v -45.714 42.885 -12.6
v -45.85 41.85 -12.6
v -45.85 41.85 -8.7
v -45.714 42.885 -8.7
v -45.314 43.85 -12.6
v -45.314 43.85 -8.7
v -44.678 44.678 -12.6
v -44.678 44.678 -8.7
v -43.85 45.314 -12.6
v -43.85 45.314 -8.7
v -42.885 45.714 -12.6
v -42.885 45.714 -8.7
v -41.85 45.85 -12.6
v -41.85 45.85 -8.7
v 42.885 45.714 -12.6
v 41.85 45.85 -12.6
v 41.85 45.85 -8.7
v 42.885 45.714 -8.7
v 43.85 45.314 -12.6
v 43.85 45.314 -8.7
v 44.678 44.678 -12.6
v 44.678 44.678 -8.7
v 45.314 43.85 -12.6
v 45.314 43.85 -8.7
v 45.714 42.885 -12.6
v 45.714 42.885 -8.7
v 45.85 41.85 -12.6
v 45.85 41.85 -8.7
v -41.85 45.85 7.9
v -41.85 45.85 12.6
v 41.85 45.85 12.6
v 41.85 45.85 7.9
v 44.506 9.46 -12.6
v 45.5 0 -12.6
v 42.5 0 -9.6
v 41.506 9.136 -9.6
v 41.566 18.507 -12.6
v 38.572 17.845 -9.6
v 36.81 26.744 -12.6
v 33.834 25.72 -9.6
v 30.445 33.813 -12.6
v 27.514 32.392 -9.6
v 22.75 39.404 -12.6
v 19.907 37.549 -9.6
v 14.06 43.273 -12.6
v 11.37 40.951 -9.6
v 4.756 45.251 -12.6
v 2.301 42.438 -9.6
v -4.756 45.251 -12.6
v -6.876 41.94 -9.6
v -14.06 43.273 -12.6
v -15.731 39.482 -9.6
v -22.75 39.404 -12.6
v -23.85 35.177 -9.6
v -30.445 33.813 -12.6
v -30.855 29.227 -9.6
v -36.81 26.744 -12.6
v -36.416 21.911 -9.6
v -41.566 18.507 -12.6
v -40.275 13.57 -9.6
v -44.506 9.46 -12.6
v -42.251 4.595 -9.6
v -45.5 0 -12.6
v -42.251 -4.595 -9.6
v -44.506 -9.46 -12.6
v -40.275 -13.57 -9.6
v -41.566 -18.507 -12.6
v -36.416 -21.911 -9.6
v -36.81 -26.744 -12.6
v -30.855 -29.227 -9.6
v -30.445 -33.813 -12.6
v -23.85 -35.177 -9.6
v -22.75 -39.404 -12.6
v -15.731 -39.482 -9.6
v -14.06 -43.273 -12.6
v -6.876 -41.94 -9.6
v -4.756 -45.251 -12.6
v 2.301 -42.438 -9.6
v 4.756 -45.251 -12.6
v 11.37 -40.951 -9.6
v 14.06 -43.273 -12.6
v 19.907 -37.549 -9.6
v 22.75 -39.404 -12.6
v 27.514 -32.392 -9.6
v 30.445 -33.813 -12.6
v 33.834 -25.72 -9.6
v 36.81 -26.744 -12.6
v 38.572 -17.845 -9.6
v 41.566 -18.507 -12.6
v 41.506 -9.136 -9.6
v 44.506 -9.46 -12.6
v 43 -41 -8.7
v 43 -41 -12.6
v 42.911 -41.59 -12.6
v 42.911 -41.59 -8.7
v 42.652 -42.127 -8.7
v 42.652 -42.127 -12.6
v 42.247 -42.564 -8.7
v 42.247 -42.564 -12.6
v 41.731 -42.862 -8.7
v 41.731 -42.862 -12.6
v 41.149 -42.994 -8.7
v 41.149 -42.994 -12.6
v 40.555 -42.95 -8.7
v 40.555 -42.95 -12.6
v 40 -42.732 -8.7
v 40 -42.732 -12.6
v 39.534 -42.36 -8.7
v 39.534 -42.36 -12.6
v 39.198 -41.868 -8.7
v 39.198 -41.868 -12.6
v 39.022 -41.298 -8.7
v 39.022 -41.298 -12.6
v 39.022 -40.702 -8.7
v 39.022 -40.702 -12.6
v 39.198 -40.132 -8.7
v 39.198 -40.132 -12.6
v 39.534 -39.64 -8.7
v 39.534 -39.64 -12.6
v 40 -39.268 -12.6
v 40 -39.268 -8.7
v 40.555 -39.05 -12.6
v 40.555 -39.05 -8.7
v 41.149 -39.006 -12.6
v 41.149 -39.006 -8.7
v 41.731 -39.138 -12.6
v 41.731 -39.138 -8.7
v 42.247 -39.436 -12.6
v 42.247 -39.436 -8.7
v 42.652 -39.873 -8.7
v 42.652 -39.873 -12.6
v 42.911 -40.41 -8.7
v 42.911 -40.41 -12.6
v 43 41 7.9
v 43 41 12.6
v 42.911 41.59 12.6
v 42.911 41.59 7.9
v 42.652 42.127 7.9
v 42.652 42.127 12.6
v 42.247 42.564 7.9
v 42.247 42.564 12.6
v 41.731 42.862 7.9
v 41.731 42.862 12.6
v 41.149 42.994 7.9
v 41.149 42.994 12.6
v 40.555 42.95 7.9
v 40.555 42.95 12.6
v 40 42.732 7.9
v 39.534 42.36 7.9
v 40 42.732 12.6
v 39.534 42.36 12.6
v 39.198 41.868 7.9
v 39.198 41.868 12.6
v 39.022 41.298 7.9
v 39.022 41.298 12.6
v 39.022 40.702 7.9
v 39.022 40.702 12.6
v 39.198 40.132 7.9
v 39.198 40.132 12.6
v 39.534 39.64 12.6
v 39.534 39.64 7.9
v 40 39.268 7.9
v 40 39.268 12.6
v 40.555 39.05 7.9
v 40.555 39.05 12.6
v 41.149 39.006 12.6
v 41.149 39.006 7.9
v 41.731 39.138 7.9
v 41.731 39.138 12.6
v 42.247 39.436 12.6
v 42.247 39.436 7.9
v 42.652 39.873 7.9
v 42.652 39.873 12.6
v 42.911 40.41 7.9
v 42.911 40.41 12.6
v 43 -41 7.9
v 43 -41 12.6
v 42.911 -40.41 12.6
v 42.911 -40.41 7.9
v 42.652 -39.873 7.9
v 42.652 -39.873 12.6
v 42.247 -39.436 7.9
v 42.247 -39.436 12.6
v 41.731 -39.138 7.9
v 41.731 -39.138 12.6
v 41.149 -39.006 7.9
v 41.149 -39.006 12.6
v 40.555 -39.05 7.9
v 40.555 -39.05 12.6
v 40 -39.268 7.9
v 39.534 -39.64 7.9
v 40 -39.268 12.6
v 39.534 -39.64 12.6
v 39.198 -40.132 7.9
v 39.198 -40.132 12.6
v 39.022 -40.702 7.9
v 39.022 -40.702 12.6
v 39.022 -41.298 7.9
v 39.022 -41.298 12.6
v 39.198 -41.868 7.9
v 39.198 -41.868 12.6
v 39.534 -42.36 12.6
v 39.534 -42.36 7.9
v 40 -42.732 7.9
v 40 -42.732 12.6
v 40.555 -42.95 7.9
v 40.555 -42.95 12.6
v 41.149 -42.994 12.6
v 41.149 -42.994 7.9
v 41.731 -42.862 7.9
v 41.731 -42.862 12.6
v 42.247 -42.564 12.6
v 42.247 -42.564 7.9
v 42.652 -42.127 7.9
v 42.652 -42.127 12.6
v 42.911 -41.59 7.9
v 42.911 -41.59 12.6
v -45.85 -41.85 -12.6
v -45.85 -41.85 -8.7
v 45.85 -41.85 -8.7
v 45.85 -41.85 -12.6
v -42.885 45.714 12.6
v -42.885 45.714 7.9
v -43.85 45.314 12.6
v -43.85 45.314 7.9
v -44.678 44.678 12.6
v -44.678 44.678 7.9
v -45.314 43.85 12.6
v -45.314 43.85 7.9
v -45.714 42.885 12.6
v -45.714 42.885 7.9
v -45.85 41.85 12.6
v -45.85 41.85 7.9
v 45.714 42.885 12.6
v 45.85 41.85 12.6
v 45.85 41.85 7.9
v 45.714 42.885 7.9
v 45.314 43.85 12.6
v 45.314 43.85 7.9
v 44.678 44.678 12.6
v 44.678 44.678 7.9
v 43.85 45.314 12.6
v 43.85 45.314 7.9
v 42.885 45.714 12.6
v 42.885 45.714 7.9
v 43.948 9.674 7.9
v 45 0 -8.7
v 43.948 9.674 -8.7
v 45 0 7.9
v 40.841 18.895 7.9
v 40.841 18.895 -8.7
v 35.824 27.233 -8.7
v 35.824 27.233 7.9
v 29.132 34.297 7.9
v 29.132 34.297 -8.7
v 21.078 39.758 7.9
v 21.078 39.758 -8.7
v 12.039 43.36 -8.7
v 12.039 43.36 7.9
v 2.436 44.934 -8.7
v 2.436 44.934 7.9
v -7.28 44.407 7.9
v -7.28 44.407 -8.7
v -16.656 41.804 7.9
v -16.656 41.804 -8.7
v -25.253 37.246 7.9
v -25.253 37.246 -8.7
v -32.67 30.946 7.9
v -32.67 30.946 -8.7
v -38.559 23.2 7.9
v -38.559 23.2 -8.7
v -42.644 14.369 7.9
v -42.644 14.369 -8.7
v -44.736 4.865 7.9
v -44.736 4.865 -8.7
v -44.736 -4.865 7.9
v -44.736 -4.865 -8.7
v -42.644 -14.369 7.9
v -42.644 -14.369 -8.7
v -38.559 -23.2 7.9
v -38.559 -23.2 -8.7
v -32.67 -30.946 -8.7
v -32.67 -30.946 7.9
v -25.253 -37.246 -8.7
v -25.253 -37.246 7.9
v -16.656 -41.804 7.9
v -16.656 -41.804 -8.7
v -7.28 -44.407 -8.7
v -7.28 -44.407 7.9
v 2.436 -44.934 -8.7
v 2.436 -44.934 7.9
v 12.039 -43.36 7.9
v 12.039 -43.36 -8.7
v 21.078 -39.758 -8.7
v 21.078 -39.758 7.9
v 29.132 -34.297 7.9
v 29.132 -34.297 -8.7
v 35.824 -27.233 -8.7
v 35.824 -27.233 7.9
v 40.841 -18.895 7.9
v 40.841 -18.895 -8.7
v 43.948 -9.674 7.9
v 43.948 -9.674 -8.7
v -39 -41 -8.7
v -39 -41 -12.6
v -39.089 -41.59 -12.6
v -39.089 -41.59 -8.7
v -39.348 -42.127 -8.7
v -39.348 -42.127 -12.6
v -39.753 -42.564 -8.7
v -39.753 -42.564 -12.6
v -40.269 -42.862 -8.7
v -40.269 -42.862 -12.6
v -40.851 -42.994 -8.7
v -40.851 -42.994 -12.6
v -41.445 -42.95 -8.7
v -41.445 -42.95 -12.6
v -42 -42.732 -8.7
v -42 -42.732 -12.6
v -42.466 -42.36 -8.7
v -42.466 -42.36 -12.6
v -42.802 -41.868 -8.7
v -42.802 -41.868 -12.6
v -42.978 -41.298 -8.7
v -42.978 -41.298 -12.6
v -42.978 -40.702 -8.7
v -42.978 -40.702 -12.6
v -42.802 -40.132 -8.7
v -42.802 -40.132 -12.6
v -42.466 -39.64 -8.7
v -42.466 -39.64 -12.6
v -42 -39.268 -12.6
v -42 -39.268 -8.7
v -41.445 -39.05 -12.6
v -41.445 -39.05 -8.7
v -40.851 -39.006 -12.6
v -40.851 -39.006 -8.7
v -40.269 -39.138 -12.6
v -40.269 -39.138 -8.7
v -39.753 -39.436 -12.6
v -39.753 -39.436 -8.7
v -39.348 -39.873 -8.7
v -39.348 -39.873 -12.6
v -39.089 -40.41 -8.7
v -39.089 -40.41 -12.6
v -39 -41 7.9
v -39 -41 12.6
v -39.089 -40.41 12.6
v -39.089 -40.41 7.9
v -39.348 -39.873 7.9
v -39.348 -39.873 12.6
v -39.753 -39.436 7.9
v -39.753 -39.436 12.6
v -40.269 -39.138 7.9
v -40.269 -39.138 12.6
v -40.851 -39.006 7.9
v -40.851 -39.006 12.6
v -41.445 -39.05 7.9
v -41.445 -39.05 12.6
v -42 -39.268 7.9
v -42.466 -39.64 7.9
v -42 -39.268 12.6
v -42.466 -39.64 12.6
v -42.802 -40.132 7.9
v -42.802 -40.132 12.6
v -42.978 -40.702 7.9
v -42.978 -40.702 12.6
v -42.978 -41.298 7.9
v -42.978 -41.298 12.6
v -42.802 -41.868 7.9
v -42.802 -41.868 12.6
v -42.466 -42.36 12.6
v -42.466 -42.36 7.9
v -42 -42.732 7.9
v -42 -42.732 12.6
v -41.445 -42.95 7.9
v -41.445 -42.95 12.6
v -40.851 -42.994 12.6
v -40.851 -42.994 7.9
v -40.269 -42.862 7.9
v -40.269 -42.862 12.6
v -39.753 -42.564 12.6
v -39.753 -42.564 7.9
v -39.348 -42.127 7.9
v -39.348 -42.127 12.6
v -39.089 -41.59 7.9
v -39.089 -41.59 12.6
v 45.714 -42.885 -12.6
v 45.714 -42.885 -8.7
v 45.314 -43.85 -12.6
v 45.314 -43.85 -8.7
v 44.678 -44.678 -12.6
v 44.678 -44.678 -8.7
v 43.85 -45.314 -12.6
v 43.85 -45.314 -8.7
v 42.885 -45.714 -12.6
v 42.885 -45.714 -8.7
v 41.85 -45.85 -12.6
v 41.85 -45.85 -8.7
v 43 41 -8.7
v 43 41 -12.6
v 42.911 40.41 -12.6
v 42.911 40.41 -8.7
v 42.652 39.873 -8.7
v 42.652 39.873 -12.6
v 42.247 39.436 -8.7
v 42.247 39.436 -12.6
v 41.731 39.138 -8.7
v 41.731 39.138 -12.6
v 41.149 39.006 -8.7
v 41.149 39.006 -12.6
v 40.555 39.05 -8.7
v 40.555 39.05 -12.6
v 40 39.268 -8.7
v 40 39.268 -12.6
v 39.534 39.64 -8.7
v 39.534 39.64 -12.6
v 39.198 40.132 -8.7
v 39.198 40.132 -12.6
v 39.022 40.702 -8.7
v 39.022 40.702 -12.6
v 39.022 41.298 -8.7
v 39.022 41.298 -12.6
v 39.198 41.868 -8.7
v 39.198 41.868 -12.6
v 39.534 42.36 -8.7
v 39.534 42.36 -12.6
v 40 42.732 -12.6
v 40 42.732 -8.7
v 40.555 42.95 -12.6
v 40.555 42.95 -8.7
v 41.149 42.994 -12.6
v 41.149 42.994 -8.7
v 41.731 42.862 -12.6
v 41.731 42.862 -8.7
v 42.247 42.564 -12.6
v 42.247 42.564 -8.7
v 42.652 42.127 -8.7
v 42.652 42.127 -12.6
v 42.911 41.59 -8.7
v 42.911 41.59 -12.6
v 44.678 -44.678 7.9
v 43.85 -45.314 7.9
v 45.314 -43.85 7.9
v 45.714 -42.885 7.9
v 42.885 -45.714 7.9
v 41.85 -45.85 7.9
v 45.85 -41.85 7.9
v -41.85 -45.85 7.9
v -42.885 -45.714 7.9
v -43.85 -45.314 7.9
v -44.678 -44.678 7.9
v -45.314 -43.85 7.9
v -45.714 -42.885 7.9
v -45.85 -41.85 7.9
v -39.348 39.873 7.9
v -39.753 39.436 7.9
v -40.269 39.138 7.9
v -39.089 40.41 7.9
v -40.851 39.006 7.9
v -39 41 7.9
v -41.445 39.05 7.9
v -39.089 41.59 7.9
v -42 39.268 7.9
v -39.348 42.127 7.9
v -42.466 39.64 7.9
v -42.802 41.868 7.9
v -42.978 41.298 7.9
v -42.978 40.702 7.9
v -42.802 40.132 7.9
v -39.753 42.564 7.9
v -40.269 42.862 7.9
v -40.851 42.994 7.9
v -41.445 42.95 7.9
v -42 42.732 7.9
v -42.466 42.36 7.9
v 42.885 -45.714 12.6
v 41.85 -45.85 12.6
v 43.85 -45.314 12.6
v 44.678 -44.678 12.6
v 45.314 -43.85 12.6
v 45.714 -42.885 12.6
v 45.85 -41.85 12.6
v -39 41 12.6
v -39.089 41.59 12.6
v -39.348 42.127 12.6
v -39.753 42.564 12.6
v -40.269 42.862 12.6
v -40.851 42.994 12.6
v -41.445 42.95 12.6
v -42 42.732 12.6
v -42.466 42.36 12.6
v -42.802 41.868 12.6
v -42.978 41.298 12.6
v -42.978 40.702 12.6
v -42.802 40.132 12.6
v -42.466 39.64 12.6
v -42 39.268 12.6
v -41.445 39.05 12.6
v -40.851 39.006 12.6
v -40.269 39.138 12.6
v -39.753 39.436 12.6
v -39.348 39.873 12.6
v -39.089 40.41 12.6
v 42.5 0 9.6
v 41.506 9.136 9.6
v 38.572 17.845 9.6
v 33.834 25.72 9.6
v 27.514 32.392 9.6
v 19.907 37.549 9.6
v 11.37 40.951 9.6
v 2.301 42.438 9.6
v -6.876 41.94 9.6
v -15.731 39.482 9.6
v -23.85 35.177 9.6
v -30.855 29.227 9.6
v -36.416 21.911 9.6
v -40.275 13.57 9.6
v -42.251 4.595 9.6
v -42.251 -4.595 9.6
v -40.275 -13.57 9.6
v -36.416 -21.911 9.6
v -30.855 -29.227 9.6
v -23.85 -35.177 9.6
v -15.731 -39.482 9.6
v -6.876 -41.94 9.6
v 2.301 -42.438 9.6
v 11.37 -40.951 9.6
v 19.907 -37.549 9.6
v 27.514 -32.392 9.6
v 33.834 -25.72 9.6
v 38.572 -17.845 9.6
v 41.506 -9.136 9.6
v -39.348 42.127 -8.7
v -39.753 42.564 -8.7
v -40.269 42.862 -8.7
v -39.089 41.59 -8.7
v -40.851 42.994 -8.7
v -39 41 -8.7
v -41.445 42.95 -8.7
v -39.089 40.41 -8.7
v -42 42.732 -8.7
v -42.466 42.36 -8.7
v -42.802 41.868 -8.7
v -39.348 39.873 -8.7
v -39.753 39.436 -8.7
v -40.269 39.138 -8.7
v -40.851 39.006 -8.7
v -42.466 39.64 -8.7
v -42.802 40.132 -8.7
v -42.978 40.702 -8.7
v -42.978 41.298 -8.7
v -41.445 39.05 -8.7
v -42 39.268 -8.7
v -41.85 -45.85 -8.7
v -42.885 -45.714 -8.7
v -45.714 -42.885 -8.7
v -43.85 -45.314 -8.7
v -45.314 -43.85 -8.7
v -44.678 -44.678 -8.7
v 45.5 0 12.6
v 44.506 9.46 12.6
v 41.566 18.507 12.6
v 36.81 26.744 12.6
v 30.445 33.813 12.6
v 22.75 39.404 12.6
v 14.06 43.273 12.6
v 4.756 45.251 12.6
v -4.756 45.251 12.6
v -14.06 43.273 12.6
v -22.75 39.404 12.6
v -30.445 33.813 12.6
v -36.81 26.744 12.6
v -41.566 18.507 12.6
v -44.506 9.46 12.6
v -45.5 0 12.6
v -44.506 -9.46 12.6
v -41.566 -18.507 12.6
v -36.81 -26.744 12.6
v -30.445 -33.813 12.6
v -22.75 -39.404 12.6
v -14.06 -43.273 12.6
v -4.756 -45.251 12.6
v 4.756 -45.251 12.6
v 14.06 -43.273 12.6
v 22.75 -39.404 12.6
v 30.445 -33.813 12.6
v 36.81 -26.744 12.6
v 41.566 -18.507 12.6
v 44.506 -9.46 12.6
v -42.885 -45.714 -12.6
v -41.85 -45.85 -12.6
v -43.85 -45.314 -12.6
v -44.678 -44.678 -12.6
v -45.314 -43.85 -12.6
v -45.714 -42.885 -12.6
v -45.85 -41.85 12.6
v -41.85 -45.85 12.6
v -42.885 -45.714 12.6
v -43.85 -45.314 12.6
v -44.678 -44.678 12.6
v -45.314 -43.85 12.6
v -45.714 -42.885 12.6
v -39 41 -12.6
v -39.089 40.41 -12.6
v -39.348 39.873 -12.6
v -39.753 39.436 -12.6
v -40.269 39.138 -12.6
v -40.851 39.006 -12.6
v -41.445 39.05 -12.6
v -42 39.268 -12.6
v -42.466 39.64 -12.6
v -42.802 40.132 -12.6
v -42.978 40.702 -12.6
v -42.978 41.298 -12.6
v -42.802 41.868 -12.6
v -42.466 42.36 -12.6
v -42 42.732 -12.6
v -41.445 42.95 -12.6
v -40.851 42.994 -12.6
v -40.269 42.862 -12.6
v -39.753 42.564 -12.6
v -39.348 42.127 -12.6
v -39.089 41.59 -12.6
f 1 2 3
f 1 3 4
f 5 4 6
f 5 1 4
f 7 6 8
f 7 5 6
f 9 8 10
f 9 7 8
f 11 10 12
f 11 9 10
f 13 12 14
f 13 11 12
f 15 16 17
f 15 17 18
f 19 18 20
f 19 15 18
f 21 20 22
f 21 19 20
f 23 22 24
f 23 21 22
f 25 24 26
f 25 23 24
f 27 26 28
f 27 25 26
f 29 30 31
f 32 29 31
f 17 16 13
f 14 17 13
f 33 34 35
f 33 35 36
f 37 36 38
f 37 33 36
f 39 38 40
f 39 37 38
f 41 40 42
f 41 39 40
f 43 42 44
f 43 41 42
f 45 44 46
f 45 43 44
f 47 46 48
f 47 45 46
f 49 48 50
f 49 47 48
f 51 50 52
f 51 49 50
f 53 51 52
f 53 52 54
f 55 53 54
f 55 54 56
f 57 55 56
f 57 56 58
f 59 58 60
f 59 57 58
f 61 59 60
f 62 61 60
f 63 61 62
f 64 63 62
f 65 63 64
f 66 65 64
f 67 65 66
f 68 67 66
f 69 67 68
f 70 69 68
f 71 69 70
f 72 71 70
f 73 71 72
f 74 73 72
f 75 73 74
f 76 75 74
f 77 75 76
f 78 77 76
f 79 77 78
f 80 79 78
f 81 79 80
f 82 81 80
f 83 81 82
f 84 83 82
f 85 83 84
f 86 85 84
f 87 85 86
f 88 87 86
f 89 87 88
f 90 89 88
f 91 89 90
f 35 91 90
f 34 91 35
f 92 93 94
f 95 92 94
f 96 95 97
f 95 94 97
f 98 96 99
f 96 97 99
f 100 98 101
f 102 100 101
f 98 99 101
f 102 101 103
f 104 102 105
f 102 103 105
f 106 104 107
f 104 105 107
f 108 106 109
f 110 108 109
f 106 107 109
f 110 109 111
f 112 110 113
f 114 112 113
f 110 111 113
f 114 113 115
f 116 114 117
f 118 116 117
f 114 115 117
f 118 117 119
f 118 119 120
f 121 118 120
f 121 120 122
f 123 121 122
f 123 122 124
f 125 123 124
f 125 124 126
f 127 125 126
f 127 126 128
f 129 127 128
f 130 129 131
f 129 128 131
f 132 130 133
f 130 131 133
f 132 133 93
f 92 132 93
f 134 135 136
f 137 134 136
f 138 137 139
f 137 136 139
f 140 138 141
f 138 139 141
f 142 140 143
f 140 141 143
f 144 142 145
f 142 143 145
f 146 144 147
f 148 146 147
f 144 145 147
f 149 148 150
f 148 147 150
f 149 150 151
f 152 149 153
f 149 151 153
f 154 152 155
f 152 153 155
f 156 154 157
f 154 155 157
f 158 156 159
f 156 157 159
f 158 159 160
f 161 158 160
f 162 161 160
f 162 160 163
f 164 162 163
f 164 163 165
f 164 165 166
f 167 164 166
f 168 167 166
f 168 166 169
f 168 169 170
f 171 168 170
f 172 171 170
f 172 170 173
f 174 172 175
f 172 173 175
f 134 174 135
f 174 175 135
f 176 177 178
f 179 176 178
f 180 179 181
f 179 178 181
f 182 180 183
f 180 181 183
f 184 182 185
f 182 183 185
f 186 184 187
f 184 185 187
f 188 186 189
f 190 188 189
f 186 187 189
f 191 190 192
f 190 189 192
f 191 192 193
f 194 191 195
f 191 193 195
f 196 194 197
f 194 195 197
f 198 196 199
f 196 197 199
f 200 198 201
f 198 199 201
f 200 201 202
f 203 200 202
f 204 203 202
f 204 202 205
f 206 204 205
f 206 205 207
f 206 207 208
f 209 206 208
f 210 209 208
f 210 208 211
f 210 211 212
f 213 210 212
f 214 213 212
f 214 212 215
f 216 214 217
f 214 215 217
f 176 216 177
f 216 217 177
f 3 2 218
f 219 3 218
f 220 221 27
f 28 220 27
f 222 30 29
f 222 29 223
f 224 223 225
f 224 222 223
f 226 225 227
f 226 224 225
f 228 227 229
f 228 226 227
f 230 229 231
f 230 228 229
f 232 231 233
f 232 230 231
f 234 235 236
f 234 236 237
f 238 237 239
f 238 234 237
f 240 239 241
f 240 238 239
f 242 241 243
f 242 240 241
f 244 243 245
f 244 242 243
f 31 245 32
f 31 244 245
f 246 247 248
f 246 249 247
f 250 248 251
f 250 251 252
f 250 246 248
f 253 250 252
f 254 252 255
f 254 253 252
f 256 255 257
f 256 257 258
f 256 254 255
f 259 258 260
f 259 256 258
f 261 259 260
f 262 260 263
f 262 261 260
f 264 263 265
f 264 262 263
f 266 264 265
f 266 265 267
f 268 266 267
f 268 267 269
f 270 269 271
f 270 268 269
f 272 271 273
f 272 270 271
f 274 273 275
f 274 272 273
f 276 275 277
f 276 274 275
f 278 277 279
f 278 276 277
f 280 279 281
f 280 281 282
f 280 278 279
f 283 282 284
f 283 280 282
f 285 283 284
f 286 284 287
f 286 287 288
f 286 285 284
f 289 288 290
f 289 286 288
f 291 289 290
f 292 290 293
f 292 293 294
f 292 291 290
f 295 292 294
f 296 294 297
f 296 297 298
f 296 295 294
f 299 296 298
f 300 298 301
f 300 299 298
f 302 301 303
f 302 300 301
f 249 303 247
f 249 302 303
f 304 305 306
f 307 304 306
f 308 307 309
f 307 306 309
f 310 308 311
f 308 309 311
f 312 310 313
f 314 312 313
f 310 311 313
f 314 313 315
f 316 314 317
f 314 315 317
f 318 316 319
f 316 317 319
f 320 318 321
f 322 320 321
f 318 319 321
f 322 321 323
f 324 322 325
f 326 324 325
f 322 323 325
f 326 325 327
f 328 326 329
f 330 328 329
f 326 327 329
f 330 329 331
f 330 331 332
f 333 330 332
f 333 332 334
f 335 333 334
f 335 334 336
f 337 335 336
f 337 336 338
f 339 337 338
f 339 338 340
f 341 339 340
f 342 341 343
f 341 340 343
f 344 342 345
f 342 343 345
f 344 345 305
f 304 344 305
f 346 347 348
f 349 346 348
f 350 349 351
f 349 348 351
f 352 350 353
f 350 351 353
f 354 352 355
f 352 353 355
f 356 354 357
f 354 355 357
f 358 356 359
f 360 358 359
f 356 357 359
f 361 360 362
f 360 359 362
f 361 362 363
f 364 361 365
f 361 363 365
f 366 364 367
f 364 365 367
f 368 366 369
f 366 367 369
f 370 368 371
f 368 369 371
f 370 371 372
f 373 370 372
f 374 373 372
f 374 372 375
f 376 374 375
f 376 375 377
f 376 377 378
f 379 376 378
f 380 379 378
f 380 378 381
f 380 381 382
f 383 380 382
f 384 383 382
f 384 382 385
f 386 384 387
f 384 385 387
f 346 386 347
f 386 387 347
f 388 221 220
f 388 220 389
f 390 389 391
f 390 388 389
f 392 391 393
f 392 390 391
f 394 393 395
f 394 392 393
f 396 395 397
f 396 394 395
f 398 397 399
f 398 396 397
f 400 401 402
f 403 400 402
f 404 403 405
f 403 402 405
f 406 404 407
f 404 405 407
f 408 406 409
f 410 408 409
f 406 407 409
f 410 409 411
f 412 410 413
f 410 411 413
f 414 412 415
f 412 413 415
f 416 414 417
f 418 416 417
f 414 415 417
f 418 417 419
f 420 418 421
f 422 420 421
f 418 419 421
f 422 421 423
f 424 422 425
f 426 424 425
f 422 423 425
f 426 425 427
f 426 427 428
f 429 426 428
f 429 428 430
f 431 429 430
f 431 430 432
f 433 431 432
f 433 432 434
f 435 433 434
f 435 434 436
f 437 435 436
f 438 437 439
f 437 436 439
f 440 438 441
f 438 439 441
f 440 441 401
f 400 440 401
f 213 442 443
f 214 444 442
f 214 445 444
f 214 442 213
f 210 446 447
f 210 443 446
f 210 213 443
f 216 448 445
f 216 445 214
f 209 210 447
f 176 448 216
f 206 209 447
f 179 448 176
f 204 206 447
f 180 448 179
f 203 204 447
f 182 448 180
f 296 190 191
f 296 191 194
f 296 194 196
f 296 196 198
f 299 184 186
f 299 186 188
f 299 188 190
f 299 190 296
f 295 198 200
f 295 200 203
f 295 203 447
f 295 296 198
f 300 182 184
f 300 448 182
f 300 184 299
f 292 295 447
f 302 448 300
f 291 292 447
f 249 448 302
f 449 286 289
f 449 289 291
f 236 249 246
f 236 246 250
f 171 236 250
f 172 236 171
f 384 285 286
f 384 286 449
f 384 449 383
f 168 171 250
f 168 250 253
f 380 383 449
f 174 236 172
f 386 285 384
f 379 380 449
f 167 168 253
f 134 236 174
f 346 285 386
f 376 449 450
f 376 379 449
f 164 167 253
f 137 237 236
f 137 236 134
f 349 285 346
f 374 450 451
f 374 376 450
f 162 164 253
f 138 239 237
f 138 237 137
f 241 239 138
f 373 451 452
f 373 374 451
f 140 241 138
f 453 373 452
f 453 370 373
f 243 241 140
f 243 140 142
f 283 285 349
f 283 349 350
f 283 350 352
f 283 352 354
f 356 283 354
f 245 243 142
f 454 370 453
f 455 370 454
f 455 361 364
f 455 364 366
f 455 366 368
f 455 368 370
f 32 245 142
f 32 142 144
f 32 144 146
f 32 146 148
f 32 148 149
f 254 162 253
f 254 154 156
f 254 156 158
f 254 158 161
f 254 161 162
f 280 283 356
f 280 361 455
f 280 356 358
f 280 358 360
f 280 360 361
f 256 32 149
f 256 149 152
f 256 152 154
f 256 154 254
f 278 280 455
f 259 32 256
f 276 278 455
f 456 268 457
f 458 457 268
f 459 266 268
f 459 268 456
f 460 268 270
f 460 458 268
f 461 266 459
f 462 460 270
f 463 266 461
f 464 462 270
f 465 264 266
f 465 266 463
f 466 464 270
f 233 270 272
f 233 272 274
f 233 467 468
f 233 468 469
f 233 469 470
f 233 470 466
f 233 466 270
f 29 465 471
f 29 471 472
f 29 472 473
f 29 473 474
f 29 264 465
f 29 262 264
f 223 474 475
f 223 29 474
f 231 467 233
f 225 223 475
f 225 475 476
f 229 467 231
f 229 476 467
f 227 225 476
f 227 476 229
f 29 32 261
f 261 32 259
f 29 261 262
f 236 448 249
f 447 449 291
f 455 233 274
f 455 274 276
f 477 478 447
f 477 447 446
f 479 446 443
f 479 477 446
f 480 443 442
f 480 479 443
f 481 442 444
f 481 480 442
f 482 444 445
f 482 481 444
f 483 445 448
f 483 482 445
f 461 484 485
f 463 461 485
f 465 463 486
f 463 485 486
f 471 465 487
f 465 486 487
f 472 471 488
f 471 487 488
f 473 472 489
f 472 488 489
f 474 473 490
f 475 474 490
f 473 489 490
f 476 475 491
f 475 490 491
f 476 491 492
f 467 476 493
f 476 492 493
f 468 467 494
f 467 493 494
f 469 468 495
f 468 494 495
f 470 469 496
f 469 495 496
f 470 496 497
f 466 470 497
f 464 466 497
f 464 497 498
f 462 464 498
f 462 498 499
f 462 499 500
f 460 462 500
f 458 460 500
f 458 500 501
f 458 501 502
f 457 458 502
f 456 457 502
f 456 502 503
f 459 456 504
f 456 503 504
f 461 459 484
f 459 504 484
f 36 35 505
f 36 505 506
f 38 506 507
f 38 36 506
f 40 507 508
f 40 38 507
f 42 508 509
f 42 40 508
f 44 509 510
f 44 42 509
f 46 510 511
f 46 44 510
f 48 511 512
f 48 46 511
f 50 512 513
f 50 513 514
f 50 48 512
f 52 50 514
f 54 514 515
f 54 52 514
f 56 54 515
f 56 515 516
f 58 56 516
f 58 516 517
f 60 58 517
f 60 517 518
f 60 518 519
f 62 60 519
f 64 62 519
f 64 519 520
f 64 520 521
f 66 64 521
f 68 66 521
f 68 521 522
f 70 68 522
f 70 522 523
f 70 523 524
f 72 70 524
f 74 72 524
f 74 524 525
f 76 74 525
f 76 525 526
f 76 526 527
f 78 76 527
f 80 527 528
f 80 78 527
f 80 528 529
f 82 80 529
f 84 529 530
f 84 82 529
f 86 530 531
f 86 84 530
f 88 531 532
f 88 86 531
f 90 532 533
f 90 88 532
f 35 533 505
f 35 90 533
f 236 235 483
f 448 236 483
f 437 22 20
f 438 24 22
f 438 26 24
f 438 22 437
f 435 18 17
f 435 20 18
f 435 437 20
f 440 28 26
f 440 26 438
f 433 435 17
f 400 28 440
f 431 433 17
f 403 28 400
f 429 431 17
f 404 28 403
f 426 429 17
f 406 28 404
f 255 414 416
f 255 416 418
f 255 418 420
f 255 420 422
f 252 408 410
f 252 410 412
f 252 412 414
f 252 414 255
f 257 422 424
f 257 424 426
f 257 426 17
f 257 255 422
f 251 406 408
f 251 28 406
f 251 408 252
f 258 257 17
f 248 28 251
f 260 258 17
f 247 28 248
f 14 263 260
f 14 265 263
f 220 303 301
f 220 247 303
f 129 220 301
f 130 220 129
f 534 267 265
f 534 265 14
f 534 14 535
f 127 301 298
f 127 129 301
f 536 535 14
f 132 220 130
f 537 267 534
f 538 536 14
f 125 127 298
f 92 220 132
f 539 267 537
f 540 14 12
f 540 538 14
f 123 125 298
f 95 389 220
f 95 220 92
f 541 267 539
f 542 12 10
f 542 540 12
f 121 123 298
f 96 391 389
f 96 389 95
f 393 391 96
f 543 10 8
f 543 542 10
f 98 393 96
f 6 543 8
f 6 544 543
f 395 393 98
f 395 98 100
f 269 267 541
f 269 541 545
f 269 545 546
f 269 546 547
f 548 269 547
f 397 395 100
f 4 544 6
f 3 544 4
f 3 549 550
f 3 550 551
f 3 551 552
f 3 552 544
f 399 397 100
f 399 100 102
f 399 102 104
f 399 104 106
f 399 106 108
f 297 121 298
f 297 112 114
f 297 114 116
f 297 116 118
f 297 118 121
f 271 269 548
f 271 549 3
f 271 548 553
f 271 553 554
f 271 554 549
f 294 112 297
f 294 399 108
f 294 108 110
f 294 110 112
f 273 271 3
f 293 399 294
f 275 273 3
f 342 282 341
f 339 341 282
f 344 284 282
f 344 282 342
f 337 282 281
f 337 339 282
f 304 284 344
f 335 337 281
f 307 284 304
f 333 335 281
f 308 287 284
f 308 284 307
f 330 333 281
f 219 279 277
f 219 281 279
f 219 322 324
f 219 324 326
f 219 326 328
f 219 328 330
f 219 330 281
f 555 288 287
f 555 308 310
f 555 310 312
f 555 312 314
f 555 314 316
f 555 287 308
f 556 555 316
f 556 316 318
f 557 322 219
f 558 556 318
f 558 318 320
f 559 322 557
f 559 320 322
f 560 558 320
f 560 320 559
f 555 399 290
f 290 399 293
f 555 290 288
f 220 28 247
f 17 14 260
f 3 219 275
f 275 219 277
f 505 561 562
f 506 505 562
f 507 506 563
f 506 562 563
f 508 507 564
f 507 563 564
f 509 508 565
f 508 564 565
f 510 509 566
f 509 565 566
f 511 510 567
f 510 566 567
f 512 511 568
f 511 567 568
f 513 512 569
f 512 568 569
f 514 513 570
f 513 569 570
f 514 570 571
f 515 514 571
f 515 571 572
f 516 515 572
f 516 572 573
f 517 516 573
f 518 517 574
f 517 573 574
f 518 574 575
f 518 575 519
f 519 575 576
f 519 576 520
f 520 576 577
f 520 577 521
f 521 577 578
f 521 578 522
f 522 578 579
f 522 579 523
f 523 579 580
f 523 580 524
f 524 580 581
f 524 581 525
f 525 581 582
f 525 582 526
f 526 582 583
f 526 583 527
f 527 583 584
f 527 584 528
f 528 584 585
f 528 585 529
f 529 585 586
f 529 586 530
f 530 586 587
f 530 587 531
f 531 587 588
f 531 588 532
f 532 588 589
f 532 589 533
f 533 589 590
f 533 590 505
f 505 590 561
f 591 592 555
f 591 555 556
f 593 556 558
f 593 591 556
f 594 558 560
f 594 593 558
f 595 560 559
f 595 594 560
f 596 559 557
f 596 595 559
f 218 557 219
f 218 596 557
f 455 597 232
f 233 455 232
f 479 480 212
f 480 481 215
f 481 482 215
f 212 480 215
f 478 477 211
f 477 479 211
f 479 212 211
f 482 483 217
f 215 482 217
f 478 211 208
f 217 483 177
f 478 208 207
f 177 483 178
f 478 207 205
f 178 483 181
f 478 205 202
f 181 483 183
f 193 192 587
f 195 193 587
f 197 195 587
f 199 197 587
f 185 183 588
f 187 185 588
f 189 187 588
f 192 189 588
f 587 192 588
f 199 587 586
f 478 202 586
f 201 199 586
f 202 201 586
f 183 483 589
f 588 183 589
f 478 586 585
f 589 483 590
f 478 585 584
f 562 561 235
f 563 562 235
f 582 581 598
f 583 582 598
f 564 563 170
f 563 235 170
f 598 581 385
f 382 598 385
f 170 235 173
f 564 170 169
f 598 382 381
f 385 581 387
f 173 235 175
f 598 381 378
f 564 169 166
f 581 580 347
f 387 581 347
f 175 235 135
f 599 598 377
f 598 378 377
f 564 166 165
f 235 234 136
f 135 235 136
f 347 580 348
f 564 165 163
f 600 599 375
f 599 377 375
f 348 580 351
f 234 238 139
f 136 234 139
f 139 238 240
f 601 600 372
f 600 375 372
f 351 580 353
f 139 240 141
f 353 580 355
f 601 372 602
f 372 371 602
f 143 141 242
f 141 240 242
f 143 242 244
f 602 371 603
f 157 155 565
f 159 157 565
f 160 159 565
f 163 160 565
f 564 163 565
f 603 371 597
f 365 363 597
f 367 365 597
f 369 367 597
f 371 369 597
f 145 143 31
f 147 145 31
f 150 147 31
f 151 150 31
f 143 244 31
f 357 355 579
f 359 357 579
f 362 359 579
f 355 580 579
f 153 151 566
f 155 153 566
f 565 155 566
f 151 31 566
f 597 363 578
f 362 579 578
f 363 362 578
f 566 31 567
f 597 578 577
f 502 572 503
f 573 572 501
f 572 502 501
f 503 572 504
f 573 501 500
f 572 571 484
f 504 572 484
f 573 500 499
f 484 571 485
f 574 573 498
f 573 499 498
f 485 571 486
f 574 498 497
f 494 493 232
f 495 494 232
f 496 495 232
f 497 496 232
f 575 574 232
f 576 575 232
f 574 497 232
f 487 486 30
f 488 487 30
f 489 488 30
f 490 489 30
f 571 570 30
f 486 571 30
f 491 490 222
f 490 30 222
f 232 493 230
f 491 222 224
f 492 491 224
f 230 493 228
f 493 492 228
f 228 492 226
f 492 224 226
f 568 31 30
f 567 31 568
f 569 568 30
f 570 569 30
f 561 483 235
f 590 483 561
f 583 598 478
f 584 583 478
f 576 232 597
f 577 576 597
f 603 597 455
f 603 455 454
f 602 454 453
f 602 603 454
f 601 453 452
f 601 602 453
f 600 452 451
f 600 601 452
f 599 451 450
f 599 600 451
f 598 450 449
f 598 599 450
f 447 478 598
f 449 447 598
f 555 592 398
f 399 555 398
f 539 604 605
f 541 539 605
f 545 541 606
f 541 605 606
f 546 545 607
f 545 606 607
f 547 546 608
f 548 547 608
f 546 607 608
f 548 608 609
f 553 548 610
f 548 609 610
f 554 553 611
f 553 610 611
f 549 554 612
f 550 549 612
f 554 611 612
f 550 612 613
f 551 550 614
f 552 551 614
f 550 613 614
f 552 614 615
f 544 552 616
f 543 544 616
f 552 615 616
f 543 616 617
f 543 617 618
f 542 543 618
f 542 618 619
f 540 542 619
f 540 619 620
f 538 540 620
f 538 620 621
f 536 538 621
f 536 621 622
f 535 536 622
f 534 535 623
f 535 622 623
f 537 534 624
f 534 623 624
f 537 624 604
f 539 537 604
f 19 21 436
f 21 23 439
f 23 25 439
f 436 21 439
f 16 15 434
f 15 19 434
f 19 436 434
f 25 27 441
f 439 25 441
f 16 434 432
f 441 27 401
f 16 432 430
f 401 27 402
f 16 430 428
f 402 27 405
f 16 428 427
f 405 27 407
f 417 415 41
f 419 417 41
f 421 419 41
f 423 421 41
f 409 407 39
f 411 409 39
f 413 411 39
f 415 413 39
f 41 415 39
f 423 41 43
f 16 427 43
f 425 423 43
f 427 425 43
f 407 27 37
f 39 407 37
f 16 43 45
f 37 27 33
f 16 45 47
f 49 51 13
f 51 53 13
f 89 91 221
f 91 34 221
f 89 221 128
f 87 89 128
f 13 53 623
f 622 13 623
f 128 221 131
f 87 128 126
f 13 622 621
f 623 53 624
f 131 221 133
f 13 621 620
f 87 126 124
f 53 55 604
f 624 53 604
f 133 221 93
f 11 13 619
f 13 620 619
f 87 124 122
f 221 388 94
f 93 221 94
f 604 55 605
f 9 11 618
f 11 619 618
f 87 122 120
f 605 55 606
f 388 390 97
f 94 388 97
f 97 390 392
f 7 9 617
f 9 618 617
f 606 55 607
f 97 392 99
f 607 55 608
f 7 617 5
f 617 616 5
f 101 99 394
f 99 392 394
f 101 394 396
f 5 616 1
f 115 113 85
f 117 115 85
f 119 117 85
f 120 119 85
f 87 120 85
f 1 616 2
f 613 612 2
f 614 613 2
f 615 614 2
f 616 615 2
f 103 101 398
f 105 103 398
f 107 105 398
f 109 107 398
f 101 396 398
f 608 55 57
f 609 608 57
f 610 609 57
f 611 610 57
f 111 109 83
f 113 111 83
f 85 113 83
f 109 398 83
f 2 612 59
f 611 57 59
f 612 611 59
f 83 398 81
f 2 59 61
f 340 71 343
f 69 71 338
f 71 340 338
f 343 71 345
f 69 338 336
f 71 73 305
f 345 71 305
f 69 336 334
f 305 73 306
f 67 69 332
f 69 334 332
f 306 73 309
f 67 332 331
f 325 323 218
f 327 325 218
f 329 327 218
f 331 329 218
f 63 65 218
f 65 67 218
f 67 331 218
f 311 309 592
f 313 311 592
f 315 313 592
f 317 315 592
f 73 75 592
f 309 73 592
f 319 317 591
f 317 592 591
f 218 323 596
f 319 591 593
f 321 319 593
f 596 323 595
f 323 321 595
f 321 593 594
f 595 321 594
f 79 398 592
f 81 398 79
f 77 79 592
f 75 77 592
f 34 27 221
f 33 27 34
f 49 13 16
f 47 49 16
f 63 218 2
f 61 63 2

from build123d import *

# Parameters (mm, degrees)
SKETCH_R        = 45
SKETCH_R_2      = 42.5
PAD_DEPTH       = 12.6
SKETCH001_R     = 2
SKETCH001_R_2   = 44.5
PAD001_DEPTH    = 4.7
SKETCH002_R     = 2
SKETCH002_R_2   = 44.5
PAD002_DEPTH    = 3.9
CHAMFER_SIZE    = 3
CHAMFER001_SIZE = 3


with BuildPart() as part:
    # Sketch → Pad (new body, symmetric)
    with BuildSketch(Plane.XY):
        Circle(SKETCH_R)
        Circle(SKETCH_R_2, mode=Mode.SUBTRACT)
    extrude(amount=PAD_DEPTH, both=True)

    # Sketch001 (on Face4 of Pad) → Pad001 (join)
    with BuildSketch(Plane.XY.offset(12.6)):
        with BuildLine():
            Line((-41.85, 45.85), (41.85, 45.85))
            ThreePointArc((45.85, 41.85), (44.678427, 44.678427), (41.85, 45.85))
            Line((45.85, 41.85), (45.85, -41.85))
            ThreePointArc((41.85, -45.85), (44.678427, -44.678427), (45.85, -41.85))
            Line((41.85, -45.85), (-41.85, -45.85))
            ThreePointArc((-45.85, -41.85), (-44.678427, -44.678427), (-41.85, -45.85))
            Line((-45.85, -41.85), (-45.85, 41.85))
            ThreePointArc((-41.85, 45.85), (-44.678427, 44.678427), (-45.85, 41.85))
        make_face()
        with Locations((-41, 41)):
            Circle(SKETCH001_R, mode=Mode.SUBTRACT)
        with Locations((41, 41)):
            Circle(SKETCH001_R, mode=Mode.SUBTRACT)
        with Locations((-41, -41)):
            Circle(SKETCH001_R, mode=Mode.SUBTRACT)
        with Locations((41, -41)):
            Circle(SKETCH001_R, mode=Mode.SUBTRACT)
        Circle(SKETCH001_R_2, mode=Mode.SUBTRACT)
    extrude(amount=-PAD001_DEPTH)

    # Sketch002 (on Face2 of Pad001) → Pad002 (join)
    with BuildSketch(Plane(origin=(0, 0, -12.6), x_dir=(1, 0, 0), z_dir=(0, 0, -1))):
        with BuildLine():
            Line((-41.85, 45.85), (41.85, 45.85))
            ThreePointArc((45.85, 41.85), (44.678427, 44.678427), (41.85, 45.85))
            Line((45.85, 41.85), (45.85, -41.85))
            ThreePointArc((41.85, -45.85), (44.678427, -44.678427), (45.85, -41.85))
            Line((41.85, -45.85), (-41.85, -45.85))
            ThreePointArc((-45.85, -41.85), (-44.678427, -44.678427), (-41.85, -45.85))
            Line((-45.85, -41.85), (-45.85, 41.85))
            ThreePointArc((-41.85, 45.85), (-44.678427, 44.678427), (-45.85, 41.85))
        make_face()
        with Locations((-41, 41)):
            Circle(SKETCH002_R, mode=Mode.SUBTRACT)
        with Locations((41, 41)):
            Circle(SKETCH002_R, mode=Mode.SUBTRACT)
        with Locations((-41, -41)):
            Circle(SKETCH002_R, mode=Mode.SUBTRACT)
        with Locations((41, -41)):
            Circle(SKETCH002_R, mode=Mode.SUBTRACT)
        Circle(SKETCH002_R_2, mode=Mode.SUBTRACT)
    extrude(amount=-PAD002_DEPTH)

    # Chamfer
    chamfer_edges = [part.edges().sort_by_distance(p)[0] for p in [
        (-42.5, 0, 12.6),
    ]]
    chamfer(chamfer_edges, length=CHAMFER_SIZE)

    # Chamfer001
    chamfer001_edges = [part.edges().sort_by_distance(p)[0] for p in [
        (-42.5, 0, -12.6),
    ]]
    chamfer(chamfer001_edges, length=CHAMFER001_SIZE)


solid = part.part
